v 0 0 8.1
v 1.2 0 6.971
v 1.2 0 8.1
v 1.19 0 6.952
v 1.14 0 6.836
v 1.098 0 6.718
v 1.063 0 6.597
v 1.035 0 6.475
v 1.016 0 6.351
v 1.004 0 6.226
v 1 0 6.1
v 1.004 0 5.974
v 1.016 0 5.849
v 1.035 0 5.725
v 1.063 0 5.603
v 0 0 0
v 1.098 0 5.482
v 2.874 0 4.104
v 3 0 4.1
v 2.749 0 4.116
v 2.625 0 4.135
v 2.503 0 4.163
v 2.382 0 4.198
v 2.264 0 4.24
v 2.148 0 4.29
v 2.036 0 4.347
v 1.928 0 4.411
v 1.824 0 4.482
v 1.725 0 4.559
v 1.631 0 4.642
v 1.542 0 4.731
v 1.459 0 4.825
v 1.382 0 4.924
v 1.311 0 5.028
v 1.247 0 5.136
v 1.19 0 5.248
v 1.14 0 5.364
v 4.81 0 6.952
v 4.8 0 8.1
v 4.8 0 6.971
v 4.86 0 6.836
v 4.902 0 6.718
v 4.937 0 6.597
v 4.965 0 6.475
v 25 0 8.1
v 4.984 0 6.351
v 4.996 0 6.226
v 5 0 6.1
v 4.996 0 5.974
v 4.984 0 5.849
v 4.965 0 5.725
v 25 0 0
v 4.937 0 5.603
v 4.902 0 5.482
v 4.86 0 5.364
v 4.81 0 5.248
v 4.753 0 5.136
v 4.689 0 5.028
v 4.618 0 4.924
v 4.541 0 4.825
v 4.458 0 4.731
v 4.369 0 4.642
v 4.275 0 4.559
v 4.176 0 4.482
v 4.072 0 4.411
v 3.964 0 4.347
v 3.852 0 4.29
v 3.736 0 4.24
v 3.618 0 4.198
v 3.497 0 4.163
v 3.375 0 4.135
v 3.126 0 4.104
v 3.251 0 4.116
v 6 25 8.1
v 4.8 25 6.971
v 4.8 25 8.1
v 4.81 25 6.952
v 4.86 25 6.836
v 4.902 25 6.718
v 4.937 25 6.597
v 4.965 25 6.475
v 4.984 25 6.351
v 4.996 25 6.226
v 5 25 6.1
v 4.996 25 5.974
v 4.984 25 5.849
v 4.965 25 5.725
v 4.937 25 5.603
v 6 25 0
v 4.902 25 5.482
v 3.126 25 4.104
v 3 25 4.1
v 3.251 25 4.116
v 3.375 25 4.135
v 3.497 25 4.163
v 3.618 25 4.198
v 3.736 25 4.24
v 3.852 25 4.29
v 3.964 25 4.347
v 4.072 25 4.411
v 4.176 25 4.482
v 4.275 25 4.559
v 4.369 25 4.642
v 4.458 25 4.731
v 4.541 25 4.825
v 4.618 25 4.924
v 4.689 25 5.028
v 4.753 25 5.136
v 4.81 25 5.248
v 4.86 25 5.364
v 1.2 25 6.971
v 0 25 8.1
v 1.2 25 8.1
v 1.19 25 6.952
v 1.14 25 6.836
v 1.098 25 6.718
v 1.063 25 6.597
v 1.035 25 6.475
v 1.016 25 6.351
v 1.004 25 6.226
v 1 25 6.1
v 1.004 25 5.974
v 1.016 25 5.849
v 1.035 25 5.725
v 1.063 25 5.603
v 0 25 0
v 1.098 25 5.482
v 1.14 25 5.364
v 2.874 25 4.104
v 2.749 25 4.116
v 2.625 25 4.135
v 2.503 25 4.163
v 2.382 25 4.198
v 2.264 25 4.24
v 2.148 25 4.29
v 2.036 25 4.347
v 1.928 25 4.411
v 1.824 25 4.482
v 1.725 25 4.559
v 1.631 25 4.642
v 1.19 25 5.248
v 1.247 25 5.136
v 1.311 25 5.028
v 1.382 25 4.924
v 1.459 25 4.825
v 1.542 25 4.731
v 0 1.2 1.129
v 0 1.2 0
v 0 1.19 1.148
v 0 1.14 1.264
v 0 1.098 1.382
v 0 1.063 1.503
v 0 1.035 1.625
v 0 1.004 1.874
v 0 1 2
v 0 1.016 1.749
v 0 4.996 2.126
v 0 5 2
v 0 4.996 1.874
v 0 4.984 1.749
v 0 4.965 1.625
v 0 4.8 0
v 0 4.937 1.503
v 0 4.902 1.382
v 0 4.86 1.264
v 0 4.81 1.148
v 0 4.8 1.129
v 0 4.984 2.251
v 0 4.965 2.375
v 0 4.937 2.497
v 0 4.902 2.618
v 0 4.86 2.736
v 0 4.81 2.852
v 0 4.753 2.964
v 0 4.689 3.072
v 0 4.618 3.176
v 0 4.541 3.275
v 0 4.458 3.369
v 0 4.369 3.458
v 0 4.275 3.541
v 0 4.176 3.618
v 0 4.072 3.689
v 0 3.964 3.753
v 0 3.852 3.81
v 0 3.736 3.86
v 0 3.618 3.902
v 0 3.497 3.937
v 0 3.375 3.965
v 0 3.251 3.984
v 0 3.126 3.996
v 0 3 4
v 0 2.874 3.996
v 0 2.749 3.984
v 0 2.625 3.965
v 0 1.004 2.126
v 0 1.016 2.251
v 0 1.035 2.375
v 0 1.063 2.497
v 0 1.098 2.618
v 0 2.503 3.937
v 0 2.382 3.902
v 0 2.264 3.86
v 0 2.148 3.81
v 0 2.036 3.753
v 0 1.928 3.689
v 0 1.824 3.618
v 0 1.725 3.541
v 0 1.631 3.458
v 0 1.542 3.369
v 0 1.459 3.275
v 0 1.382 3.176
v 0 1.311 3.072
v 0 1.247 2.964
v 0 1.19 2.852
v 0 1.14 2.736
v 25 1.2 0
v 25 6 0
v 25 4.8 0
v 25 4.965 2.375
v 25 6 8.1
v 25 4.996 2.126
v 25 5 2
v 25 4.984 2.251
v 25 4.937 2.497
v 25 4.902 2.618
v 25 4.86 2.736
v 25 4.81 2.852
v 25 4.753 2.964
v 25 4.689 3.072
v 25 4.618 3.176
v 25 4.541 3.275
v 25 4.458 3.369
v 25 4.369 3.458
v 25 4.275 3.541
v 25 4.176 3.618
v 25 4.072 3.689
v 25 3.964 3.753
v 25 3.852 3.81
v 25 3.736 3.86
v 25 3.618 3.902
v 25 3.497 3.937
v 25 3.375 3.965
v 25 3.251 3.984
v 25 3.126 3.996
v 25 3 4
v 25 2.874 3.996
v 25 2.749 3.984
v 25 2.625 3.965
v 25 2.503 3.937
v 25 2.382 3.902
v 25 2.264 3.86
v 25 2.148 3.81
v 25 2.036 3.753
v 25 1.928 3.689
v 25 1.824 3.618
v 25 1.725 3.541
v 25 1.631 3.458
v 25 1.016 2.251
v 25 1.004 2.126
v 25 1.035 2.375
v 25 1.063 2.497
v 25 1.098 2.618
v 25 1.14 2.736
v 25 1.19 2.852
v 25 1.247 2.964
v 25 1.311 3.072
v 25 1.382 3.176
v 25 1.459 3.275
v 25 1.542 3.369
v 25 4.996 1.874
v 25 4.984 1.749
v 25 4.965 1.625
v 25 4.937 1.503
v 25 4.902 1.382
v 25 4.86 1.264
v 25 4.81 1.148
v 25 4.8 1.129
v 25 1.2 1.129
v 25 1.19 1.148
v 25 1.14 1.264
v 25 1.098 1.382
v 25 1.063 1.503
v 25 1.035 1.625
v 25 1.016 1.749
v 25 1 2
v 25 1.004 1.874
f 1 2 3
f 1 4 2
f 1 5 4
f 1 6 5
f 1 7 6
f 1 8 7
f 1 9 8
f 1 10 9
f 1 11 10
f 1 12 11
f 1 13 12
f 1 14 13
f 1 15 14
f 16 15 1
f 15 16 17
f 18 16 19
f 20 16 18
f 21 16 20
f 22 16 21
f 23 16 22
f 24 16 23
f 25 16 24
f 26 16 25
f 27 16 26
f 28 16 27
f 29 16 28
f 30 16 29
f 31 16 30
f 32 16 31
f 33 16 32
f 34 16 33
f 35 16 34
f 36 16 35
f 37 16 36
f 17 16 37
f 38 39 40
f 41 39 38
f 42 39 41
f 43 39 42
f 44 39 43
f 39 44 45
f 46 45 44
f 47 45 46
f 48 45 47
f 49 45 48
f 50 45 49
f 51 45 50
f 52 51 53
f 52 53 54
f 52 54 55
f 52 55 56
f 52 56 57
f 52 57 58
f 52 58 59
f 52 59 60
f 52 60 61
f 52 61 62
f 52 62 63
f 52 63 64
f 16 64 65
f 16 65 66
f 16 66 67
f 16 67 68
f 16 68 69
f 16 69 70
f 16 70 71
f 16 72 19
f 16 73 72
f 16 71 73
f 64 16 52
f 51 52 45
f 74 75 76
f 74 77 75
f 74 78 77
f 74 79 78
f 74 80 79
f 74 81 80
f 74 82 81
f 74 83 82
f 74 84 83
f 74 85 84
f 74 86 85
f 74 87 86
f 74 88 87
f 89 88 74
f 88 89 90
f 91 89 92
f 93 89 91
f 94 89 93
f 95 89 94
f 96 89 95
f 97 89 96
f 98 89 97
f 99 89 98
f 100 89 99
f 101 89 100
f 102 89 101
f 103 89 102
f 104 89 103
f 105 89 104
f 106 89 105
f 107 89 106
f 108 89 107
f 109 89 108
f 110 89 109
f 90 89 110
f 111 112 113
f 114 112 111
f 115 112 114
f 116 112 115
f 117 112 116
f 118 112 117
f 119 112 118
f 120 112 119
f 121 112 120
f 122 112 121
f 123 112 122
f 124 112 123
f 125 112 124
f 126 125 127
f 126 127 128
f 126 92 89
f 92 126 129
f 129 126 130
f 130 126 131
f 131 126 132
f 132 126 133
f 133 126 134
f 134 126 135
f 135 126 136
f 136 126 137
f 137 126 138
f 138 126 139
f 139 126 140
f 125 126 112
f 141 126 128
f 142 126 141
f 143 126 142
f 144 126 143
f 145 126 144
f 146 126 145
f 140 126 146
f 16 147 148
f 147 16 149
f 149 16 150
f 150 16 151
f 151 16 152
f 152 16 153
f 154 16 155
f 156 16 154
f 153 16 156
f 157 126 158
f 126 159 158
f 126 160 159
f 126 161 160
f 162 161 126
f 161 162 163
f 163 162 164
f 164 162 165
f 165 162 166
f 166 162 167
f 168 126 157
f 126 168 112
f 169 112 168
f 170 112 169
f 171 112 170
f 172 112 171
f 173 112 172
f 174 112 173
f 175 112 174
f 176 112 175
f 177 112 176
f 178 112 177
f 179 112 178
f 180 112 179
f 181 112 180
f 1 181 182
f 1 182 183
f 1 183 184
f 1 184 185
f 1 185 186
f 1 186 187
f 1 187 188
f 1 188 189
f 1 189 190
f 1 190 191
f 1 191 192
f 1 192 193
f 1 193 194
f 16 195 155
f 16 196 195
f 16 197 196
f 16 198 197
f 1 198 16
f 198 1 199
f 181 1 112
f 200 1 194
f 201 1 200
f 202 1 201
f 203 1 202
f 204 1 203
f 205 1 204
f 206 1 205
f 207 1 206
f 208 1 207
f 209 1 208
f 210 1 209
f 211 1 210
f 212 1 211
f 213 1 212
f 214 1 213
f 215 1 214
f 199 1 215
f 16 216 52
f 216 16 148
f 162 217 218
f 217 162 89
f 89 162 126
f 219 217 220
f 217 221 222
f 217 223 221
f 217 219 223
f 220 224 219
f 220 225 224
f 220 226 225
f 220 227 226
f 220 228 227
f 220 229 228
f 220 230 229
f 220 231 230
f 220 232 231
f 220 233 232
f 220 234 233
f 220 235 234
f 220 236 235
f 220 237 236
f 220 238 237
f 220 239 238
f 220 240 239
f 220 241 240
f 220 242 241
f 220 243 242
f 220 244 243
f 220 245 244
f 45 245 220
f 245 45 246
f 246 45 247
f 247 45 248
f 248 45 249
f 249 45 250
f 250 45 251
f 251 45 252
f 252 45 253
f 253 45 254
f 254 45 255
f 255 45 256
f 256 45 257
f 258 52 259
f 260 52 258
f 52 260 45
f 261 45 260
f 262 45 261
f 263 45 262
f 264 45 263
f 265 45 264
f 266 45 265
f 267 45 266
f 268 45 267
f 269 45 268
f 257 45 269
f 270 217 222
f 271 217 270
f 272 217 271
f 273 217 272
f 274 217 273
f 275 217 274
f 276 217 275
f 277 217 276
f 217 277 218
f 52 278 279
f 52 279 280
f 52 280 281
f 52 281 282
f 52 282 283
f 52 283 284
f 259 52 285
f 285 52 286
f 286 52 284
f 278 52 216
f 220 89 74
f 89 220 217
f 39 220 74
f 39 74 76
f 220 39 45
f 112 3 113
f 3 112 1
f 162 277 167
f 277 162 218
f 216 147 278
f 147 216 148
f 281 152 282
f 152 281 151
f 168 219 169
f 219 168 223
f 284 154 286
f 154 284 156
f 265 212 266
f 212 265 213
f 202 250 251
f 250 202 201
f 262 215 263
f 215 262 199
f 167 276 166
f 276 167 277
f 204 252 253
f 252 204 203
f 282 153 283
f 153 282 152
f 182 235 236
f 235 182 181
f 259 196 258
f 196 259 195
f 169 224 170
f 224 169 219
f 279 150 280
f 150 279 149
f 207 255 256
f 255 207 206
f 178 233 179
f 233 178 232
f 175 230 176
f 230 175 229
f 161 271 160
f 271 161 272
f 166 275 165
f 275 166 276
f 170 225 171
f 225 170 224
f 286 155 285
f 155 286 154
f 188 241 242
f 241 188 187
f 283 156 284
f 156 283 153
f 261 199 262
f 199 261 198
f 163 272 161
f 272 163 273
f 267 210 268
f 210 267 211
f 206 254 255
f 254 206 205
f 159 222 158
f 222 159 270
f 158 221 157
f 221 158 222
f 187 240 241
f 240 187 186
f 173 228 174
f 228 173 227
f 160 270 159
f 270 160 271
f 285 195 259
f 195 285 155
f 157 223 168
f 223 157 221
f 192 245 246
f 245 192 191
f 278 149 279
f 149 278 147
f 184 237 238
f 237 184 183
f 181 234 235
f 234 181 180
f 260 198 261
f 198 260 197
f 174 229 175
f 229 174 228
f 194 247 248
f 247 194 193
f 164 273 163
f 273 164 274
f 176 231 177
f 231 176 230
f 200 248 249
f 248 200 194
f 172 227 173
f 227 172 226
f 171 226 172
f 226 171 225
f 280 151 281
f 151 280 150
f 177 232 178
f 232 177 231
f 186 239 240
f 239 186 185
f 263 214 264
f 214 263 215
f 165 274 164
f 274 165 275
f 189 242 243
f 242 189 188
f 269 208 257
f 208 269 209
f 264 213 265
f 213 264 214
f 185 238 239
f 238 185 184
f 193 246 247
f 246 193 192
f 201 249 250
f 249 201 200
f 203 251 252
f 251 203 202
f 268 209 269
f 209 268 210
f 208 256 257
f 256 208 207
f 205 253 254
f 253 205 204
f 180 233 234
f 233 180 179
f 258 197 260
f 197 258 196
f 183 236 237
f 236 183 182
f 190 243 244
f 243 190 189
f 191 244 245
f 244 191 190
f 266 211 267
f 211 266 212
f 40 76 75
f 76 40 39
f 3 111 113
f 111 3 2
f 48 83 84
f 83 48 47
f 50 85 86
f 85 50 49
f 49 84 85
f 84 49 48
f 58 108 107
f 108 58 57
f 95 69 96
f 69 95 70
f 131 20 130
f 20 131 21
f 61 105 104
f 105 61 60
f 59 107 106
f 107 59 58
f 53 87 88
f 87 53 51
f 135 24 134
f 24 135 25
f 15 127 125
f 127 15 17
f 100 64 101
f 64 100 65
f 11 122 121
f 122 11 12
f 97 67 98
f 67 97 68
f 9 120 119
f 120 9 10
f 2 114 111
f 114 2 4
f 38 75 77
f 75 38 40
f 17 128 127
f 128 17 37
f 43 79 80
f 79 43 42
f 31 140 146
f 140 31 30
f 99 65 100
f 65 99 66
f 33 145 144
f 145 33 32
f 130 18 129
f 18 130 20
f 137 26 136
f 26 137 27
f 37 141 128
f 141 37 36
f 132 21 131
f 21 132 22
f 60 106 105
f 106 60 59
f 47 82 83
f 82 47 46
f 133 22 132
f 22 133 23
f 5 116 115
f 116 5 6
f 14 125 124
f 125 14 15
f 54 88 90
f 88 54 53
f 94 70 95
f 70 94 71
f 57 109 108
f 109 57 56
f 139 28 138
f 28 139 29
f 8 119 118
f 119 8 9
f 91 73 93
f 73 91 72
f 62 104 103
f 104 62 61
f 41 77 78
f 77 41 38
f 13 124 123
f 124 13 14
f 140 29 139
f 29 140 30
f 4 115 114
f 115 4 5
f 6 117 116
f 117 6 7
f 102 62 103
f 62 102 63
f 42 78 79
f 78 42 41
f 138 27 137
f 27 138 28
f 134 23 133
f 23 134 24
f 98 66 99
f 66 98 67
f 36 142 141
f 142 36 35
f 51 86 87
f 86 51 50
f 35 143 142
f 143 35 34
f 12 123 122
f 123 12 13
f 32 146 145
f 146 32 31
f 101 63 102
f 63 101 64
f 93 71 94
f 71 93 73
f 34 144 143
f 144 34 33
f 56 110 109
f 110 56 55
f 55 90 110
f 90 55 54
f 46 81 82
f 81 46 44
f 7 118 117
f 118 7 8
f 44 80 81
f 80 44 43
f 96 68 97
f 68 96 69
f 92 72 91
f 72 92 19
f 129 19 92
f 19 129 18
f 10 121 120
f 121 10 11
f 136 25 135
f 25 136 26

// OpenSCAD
// Tool for sizing coordinates in 2D, which can then be measured with a caliper

module measure_xy_tool_body(
	dx= 25,
	dy= 25,
	dz= 8.1,
	slot_flare= 3,
	slot_diam= 4,
	slot_housing_diam= 6,
	$fn=100,
	o= 0.01
) {
	difference() {
		hull() {
			cube([ dx, slot_housing_diam, dz ]);
			cube([ slot_housing_diam, dy, dz ]);
		}
		
		// x-axis slot (under)
		translate([ -o, slot_housing_diam/2 - slot_diam*.5*.9, -o ])
			cube([ dx+o*2, slot_diam*.9, slot_diam/2+o ]);
		translate([ -o, slot_housing_diam/2, slot_diam/2 ])
			rotate(90, [0,1,0]) cylinder(r=slot_diam/2, h=dy+o*2);
		
		// y-axis slot (over)
		translate([ slot_housing_diam/2 - slot_diam*.5*.9, -o, dz-slot_diam/2 ])
			cube([ slot_diam*.9, dy + o*2, slot_diam/2 + o ]);
		translate([ slot_housing_diam/2, -o, dz - slot_diam/2 ])
			rotate(-90, [1,0,0]) cylinder(r=slot_diam/2, h=dx+o*2);
	}
}

module measure_xy_tool_foot(
	dx= 100,
	dy= 20,
	dz= 1,
	foot_dz= 10,
	ridge_diam= 3.8,
	ridge_y= 3,
	$fn=100,
	o= 0.01
) {
	difference() {
		union() {
			cube([ dx, dy, dz ]);
			cube([ 1, dy, foot_dz ]);
			#translate([ 0, ridge_y-ridge_diam/2*.9, 0 ]) cube([ dx, ridge_diam*.9, dz+ridge_diam/2 ]); 
			translate([ 0, ridge_y, dz + ridge_diam/2 ]) rotate(90, [0,1,0]) cylinder(r=ridge_diam/2, h=dx);
		}
		translate([ 0, dy, -o ])
			rotate(90-atan((dy-1)/dx), [0,0,1])
				translate([ 0, -dx-dy, 0 ]) cube([ dx+dy, dx+dy+1, foot_dz+o*2 ]);
	}
}

measure_xy_tool_body();
//measure_xy_tool_foot(dx=160);
//measure_xy_tool_foot(dx=50, dy=30);
